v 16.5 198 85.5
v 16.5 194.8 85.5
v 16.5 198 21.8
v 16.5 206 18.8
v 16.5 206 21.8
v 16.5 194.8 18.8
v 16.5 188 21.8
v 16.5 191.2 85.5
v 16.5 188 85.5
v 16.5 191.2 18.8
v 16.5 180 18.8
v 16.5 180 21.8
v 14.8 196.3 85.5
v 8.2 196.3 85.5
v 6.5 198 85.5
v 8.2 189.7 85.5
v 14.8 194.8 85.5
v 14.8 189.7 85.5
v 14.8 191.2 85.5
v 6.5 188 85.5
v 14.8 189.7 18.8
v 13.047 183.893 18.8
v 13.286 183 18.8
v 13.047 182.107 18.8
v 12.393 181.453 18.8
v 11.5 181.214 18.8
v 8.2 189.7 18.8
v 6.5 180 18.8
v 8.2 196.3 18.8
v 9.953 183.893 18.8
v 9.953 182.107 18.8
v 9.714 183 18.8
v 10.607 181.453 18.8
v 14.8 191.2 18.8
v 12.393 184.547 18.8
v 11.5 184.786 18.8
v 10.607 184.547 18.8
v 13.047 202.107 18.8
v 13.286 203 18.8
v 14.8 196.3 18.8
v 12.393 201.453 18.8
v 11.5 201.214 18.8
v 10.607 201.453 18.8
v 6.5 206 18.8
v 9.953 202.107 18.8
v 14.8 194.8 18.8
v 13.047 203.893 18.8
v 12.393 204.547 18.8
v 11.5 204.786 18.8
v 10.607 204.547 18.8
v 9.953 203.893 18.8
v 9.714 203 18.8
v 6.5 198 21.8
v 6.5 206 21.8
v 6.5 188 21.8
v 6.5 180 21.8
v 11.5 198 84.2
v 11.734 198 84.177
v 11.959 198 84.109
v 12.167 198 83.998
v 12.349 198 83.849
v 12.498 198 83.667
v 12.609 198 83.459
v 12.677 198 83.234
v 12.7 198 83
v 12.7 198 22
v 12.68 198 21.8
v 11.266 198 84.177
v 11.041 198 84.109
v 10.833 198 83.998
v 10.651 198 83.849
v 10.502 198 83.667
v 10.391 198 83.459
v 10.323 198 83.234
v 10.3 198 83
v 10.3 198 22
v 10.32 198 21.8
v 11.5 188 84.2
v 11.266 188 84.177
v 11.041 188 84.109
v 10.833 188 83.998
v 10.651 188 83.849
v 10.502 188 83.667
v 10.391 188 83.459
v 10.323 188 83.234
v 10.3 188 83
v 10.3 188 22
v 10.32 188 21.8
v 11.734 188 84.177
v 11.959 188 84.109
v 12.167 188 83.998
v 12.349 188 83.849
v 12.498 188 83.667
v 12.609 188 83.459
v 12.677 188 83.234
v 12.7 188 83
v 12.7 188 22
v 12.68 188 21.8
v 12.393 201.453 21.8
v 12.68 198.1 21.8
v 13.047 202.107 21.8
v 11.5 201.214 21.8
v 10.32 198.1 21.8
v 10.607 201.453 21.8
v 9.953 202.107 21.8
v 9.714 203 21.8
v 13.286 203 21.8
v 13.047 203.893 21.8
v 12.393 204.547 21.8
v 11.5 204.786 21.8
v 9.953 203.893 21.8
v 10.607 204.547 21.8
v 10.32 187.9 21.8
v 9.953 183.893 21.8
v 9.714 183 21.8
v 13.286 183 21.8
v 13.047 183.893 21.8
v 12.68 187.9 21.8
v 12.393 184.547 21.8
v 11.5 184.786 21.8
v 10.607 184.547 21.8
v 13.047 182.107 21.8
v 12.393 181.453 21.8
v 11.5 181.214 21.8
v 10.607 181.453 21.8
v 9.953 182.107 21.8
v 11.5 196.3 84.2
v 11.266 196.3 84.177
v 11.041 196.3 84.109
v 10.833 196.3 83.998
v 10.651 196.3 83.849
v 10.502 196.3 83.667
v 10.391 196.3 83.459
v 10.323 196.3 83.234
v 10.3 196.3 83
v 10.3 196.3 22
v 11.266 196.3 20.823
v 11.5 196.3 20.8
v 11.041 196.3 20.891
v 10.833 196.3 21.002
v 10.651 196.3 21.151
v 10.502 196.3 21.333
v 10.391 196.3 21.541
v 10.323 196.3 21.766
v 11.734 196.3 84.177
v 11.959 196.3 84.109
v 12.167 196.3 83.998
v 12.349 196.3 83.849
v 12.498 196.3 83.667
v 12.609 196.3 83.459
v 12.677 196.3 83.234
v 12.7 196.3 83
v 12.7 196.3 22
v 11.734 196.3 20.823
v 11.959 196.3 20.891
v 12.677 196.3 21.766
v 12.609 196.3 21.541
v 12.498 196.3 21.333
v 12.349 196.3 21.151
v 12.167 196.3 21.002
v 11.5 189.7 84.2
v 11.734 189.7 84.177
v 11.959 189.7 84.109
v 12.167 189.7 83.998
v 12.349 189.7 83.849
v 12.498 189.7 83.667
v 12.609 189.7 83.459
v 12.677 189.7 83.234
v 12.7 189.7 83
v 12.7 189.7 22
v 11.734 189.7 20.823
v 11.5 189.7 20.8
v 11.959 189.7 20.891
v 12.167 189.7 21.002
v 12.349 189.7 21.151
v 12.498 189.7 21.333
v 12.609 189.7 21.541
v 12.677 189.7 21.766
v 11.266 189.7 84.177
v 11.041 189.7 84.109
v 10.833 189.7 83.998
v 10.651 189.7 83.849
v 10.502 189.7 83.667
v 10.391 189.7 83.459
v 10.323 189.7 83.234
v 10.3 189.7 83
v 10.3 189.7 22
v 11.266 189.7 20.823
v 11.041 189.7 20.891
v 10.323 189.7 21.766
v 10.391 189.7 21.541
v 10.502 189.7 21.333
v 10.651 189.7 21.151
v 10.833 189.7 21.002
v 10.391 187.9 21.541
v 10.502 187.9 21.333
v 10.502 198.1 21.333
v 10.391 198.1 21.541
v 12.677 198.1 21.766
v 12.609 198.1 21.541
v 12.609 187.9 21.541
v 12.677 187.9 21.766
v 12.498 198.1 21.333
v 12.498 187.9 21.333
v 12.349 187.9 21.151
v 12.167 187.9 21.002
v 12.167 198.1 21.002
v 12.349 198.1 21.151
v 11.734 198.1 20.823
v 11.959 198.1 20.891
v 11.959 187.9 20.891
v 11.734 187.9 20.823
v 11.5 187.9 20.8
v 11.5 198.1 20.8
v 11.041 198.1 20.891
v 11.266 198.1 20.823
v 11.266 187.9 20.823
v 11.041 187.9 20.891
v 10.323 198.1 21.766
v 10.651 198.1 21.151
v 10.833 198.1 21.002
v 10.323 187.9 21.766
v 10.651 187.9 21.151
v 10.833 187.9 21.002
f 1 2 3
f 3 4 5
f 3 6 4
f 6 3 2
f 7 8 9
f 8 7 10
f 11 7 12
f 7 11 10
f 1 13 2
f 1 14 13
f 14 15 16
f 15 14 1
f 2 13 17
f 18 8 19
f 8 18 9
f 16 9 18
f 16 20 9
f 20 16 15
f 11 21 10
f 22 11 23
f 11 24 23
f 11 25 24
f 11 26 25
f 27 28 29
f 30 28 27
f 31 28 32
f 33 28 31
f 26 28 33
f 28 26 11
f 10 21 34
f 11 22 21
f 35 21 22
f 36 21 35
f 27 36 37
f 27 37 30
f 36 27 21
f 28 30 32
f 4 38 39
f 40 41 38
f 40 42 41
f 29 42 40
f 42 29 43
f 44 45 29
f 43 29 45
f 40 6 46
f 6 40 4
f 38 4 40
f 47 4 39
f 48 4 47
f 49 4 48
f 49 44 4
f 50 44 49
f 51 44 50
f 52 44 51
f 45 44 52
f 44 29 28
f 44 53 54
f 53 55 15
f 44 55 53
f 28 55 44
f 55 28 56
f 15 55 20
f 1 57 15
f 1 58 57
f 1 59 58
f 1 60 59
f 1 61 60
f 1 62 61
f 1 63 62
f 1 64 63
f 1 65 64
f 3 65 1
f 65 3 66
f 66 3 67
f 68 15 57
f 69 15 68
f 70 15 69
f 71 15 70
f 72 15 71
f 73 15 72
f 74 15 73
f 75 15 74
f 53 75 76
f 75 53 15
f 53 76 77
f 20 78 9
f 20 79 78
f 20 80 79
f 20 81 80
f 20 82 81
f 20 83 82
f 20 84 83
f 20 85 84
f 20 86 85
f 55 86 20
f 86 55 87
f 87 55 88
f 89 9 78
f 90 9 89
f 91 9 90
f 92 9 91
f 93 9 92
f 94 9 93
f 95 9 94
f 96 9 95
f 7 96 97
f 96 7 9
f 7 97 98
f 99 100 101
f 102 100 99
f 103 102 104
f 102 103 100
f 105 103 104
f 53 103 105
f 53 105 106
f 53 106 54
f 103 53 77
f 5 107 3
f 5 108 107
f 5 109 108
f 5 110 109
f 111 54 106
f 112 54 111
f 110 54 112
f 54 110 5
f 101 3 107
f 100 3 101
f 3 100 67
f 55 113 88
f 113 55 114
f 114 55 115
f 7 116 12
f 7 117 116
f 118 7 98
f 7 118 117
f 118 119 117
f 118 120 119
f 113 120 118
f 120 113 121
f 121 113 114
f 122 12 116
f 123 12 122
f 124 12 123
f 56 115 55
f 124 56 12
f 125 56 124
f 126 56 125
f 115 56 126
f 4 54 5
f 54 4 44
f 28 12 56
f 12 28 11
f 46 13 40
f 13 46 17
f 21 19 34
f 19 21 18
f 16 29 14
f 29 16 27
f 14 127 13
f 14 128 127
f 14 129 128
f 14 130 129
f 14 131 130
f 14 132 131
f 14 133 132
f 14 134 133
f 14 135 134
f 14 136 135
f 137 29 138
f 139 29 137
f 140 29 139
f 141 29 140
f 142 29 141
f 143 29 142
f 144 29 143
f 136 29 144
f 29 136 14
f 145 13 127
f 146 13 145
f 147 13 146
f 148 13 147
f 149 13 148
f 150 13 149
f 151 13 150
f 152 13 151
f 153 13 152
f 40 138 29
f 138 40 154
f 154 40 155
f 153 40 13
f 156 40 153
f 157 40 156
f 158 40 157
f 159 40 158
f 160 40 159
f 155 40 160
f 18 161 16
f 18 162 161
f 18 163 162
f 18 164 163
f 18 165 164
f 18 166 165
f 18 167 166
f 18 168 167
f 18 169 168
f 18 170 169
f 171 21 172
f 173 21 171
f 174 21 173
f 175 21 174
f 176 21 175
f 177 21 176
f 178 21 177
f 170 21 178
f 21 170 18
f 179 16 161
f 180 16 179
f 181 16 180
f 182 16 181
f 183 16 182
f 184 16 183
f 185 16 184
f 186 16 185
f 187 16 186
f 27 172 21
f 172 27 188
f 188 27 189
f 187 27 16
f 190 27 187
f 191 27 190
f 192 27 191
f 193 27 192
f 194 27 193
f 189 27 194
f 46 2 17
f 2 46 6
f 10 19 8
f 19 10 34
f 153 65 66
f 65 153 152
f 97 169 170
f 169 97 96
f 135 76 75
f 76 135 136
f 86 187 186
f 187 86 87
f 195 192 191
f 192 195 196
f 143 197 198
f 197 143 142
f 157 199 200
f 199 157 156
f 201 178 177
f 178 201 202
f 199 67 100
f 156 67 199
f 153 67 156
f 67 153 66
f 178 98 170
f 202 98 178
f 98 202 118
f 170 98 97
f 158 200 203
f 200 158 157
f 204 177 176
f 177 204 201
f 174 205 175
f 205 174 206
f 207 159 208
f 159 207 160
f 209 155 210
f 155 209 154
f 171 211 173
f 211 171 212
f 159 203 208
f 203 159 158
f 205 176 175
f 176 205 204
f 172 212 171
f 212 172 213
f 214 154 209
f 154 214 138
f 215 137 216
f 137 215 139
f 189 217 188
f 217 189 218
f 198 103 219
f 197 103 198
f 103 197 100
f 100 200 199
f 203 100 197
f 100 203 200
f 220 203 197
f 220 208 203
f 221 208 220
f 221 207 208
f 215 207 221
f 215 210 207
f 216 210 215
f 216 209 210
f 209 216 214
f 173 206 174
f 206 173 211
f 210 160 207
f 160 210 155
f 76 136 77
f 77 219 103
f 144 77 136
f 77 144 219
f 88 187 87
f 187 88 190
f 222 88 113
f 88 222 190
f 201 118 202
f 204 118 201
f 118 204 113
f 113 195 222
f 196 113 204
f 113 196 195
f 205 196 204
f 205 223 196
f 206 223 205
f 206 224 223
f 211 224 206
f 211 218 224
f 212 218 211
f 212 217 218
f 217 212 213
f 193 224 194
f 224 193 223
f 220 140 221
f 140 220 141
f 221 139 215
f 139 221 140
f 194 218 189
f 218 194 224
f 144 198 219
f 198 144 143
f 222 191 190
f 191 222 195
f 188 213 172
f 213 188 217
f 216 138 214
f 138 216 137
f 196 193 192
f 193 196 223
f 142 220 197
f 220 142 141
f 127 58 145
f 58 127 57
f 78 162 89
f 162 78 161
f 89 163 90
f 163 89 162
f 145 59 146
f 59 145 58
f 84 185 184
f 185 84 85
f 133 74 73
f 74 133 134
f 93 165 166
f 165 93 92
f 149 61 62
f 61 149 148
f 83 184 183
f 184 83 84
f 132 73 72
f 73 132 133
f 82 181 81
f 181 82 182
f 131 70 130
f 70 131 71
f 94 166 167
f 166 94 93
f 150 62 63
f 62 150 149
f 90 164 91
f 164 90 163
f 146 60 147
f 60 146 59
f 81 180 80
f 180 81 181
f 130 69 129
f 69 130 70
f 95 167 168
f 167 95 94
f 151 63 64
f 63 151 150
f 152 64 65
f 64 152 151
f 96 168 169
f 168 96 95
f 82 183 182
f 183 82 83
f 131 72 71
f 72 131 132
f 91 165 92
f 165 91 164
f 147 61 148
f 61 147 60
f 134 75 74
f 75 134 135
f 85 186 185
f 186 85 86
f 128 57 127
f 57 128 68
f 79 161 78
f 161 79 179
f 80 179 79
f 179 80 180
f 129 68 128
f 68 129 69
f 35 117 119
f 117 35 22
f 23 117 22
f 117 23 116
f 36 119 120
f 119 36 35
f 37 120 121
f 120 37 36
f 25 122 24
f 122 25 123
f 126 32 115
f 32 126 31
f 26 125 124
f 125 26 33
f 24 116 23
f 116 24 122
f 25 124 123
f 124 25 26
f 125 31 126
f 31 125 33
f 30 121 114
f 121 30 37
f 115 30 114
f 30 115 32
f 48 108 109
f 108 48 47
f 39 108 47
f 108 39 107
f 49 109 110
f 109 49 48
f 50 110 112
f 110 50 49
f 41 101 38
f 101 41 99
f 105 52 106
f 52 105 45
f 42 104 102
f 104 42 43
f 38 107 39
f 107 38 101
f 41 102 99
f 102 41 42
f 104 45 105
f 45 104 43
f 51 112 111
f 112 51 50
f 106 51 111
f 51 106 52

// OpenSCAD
// Generated from the same CSG operations as STEP. Rebuild with spec/build_parent_hand_service.py.
difference(){difference(){difference(){difference(){difference(){difference(){difference(){union(){translate([6.5,188,18.8]) cube([10,10,66.7]);translate([6.5,180,18.8]) cube([10,26,3]);}translate([8.2,189.7,18.7]) cube([6.6,6.6,66.9]);}translate([11.5,191.2,18.7]) cube([5.1,3.6,67]);}translate([10.3,187.9,22]) cube([2.4,10.2,61]);}translate([11.5,187.9,22]) rotate([-90,0,0]) cylinder(r=1.2,h=10.2,$fn=32);}translate([11.5,187.9,83]) rotate([-90,0,0]) cylinder(r=1.2,h=10.2,$fn=32);}translate([11.5,183,18.7]) cylinder(r=1.7858514112073933,h=3.2,$fn=12);}translate([11.5,203,18.7]) cylinder(r=1.7858514112073933,h=3.2,$fn=12);}
